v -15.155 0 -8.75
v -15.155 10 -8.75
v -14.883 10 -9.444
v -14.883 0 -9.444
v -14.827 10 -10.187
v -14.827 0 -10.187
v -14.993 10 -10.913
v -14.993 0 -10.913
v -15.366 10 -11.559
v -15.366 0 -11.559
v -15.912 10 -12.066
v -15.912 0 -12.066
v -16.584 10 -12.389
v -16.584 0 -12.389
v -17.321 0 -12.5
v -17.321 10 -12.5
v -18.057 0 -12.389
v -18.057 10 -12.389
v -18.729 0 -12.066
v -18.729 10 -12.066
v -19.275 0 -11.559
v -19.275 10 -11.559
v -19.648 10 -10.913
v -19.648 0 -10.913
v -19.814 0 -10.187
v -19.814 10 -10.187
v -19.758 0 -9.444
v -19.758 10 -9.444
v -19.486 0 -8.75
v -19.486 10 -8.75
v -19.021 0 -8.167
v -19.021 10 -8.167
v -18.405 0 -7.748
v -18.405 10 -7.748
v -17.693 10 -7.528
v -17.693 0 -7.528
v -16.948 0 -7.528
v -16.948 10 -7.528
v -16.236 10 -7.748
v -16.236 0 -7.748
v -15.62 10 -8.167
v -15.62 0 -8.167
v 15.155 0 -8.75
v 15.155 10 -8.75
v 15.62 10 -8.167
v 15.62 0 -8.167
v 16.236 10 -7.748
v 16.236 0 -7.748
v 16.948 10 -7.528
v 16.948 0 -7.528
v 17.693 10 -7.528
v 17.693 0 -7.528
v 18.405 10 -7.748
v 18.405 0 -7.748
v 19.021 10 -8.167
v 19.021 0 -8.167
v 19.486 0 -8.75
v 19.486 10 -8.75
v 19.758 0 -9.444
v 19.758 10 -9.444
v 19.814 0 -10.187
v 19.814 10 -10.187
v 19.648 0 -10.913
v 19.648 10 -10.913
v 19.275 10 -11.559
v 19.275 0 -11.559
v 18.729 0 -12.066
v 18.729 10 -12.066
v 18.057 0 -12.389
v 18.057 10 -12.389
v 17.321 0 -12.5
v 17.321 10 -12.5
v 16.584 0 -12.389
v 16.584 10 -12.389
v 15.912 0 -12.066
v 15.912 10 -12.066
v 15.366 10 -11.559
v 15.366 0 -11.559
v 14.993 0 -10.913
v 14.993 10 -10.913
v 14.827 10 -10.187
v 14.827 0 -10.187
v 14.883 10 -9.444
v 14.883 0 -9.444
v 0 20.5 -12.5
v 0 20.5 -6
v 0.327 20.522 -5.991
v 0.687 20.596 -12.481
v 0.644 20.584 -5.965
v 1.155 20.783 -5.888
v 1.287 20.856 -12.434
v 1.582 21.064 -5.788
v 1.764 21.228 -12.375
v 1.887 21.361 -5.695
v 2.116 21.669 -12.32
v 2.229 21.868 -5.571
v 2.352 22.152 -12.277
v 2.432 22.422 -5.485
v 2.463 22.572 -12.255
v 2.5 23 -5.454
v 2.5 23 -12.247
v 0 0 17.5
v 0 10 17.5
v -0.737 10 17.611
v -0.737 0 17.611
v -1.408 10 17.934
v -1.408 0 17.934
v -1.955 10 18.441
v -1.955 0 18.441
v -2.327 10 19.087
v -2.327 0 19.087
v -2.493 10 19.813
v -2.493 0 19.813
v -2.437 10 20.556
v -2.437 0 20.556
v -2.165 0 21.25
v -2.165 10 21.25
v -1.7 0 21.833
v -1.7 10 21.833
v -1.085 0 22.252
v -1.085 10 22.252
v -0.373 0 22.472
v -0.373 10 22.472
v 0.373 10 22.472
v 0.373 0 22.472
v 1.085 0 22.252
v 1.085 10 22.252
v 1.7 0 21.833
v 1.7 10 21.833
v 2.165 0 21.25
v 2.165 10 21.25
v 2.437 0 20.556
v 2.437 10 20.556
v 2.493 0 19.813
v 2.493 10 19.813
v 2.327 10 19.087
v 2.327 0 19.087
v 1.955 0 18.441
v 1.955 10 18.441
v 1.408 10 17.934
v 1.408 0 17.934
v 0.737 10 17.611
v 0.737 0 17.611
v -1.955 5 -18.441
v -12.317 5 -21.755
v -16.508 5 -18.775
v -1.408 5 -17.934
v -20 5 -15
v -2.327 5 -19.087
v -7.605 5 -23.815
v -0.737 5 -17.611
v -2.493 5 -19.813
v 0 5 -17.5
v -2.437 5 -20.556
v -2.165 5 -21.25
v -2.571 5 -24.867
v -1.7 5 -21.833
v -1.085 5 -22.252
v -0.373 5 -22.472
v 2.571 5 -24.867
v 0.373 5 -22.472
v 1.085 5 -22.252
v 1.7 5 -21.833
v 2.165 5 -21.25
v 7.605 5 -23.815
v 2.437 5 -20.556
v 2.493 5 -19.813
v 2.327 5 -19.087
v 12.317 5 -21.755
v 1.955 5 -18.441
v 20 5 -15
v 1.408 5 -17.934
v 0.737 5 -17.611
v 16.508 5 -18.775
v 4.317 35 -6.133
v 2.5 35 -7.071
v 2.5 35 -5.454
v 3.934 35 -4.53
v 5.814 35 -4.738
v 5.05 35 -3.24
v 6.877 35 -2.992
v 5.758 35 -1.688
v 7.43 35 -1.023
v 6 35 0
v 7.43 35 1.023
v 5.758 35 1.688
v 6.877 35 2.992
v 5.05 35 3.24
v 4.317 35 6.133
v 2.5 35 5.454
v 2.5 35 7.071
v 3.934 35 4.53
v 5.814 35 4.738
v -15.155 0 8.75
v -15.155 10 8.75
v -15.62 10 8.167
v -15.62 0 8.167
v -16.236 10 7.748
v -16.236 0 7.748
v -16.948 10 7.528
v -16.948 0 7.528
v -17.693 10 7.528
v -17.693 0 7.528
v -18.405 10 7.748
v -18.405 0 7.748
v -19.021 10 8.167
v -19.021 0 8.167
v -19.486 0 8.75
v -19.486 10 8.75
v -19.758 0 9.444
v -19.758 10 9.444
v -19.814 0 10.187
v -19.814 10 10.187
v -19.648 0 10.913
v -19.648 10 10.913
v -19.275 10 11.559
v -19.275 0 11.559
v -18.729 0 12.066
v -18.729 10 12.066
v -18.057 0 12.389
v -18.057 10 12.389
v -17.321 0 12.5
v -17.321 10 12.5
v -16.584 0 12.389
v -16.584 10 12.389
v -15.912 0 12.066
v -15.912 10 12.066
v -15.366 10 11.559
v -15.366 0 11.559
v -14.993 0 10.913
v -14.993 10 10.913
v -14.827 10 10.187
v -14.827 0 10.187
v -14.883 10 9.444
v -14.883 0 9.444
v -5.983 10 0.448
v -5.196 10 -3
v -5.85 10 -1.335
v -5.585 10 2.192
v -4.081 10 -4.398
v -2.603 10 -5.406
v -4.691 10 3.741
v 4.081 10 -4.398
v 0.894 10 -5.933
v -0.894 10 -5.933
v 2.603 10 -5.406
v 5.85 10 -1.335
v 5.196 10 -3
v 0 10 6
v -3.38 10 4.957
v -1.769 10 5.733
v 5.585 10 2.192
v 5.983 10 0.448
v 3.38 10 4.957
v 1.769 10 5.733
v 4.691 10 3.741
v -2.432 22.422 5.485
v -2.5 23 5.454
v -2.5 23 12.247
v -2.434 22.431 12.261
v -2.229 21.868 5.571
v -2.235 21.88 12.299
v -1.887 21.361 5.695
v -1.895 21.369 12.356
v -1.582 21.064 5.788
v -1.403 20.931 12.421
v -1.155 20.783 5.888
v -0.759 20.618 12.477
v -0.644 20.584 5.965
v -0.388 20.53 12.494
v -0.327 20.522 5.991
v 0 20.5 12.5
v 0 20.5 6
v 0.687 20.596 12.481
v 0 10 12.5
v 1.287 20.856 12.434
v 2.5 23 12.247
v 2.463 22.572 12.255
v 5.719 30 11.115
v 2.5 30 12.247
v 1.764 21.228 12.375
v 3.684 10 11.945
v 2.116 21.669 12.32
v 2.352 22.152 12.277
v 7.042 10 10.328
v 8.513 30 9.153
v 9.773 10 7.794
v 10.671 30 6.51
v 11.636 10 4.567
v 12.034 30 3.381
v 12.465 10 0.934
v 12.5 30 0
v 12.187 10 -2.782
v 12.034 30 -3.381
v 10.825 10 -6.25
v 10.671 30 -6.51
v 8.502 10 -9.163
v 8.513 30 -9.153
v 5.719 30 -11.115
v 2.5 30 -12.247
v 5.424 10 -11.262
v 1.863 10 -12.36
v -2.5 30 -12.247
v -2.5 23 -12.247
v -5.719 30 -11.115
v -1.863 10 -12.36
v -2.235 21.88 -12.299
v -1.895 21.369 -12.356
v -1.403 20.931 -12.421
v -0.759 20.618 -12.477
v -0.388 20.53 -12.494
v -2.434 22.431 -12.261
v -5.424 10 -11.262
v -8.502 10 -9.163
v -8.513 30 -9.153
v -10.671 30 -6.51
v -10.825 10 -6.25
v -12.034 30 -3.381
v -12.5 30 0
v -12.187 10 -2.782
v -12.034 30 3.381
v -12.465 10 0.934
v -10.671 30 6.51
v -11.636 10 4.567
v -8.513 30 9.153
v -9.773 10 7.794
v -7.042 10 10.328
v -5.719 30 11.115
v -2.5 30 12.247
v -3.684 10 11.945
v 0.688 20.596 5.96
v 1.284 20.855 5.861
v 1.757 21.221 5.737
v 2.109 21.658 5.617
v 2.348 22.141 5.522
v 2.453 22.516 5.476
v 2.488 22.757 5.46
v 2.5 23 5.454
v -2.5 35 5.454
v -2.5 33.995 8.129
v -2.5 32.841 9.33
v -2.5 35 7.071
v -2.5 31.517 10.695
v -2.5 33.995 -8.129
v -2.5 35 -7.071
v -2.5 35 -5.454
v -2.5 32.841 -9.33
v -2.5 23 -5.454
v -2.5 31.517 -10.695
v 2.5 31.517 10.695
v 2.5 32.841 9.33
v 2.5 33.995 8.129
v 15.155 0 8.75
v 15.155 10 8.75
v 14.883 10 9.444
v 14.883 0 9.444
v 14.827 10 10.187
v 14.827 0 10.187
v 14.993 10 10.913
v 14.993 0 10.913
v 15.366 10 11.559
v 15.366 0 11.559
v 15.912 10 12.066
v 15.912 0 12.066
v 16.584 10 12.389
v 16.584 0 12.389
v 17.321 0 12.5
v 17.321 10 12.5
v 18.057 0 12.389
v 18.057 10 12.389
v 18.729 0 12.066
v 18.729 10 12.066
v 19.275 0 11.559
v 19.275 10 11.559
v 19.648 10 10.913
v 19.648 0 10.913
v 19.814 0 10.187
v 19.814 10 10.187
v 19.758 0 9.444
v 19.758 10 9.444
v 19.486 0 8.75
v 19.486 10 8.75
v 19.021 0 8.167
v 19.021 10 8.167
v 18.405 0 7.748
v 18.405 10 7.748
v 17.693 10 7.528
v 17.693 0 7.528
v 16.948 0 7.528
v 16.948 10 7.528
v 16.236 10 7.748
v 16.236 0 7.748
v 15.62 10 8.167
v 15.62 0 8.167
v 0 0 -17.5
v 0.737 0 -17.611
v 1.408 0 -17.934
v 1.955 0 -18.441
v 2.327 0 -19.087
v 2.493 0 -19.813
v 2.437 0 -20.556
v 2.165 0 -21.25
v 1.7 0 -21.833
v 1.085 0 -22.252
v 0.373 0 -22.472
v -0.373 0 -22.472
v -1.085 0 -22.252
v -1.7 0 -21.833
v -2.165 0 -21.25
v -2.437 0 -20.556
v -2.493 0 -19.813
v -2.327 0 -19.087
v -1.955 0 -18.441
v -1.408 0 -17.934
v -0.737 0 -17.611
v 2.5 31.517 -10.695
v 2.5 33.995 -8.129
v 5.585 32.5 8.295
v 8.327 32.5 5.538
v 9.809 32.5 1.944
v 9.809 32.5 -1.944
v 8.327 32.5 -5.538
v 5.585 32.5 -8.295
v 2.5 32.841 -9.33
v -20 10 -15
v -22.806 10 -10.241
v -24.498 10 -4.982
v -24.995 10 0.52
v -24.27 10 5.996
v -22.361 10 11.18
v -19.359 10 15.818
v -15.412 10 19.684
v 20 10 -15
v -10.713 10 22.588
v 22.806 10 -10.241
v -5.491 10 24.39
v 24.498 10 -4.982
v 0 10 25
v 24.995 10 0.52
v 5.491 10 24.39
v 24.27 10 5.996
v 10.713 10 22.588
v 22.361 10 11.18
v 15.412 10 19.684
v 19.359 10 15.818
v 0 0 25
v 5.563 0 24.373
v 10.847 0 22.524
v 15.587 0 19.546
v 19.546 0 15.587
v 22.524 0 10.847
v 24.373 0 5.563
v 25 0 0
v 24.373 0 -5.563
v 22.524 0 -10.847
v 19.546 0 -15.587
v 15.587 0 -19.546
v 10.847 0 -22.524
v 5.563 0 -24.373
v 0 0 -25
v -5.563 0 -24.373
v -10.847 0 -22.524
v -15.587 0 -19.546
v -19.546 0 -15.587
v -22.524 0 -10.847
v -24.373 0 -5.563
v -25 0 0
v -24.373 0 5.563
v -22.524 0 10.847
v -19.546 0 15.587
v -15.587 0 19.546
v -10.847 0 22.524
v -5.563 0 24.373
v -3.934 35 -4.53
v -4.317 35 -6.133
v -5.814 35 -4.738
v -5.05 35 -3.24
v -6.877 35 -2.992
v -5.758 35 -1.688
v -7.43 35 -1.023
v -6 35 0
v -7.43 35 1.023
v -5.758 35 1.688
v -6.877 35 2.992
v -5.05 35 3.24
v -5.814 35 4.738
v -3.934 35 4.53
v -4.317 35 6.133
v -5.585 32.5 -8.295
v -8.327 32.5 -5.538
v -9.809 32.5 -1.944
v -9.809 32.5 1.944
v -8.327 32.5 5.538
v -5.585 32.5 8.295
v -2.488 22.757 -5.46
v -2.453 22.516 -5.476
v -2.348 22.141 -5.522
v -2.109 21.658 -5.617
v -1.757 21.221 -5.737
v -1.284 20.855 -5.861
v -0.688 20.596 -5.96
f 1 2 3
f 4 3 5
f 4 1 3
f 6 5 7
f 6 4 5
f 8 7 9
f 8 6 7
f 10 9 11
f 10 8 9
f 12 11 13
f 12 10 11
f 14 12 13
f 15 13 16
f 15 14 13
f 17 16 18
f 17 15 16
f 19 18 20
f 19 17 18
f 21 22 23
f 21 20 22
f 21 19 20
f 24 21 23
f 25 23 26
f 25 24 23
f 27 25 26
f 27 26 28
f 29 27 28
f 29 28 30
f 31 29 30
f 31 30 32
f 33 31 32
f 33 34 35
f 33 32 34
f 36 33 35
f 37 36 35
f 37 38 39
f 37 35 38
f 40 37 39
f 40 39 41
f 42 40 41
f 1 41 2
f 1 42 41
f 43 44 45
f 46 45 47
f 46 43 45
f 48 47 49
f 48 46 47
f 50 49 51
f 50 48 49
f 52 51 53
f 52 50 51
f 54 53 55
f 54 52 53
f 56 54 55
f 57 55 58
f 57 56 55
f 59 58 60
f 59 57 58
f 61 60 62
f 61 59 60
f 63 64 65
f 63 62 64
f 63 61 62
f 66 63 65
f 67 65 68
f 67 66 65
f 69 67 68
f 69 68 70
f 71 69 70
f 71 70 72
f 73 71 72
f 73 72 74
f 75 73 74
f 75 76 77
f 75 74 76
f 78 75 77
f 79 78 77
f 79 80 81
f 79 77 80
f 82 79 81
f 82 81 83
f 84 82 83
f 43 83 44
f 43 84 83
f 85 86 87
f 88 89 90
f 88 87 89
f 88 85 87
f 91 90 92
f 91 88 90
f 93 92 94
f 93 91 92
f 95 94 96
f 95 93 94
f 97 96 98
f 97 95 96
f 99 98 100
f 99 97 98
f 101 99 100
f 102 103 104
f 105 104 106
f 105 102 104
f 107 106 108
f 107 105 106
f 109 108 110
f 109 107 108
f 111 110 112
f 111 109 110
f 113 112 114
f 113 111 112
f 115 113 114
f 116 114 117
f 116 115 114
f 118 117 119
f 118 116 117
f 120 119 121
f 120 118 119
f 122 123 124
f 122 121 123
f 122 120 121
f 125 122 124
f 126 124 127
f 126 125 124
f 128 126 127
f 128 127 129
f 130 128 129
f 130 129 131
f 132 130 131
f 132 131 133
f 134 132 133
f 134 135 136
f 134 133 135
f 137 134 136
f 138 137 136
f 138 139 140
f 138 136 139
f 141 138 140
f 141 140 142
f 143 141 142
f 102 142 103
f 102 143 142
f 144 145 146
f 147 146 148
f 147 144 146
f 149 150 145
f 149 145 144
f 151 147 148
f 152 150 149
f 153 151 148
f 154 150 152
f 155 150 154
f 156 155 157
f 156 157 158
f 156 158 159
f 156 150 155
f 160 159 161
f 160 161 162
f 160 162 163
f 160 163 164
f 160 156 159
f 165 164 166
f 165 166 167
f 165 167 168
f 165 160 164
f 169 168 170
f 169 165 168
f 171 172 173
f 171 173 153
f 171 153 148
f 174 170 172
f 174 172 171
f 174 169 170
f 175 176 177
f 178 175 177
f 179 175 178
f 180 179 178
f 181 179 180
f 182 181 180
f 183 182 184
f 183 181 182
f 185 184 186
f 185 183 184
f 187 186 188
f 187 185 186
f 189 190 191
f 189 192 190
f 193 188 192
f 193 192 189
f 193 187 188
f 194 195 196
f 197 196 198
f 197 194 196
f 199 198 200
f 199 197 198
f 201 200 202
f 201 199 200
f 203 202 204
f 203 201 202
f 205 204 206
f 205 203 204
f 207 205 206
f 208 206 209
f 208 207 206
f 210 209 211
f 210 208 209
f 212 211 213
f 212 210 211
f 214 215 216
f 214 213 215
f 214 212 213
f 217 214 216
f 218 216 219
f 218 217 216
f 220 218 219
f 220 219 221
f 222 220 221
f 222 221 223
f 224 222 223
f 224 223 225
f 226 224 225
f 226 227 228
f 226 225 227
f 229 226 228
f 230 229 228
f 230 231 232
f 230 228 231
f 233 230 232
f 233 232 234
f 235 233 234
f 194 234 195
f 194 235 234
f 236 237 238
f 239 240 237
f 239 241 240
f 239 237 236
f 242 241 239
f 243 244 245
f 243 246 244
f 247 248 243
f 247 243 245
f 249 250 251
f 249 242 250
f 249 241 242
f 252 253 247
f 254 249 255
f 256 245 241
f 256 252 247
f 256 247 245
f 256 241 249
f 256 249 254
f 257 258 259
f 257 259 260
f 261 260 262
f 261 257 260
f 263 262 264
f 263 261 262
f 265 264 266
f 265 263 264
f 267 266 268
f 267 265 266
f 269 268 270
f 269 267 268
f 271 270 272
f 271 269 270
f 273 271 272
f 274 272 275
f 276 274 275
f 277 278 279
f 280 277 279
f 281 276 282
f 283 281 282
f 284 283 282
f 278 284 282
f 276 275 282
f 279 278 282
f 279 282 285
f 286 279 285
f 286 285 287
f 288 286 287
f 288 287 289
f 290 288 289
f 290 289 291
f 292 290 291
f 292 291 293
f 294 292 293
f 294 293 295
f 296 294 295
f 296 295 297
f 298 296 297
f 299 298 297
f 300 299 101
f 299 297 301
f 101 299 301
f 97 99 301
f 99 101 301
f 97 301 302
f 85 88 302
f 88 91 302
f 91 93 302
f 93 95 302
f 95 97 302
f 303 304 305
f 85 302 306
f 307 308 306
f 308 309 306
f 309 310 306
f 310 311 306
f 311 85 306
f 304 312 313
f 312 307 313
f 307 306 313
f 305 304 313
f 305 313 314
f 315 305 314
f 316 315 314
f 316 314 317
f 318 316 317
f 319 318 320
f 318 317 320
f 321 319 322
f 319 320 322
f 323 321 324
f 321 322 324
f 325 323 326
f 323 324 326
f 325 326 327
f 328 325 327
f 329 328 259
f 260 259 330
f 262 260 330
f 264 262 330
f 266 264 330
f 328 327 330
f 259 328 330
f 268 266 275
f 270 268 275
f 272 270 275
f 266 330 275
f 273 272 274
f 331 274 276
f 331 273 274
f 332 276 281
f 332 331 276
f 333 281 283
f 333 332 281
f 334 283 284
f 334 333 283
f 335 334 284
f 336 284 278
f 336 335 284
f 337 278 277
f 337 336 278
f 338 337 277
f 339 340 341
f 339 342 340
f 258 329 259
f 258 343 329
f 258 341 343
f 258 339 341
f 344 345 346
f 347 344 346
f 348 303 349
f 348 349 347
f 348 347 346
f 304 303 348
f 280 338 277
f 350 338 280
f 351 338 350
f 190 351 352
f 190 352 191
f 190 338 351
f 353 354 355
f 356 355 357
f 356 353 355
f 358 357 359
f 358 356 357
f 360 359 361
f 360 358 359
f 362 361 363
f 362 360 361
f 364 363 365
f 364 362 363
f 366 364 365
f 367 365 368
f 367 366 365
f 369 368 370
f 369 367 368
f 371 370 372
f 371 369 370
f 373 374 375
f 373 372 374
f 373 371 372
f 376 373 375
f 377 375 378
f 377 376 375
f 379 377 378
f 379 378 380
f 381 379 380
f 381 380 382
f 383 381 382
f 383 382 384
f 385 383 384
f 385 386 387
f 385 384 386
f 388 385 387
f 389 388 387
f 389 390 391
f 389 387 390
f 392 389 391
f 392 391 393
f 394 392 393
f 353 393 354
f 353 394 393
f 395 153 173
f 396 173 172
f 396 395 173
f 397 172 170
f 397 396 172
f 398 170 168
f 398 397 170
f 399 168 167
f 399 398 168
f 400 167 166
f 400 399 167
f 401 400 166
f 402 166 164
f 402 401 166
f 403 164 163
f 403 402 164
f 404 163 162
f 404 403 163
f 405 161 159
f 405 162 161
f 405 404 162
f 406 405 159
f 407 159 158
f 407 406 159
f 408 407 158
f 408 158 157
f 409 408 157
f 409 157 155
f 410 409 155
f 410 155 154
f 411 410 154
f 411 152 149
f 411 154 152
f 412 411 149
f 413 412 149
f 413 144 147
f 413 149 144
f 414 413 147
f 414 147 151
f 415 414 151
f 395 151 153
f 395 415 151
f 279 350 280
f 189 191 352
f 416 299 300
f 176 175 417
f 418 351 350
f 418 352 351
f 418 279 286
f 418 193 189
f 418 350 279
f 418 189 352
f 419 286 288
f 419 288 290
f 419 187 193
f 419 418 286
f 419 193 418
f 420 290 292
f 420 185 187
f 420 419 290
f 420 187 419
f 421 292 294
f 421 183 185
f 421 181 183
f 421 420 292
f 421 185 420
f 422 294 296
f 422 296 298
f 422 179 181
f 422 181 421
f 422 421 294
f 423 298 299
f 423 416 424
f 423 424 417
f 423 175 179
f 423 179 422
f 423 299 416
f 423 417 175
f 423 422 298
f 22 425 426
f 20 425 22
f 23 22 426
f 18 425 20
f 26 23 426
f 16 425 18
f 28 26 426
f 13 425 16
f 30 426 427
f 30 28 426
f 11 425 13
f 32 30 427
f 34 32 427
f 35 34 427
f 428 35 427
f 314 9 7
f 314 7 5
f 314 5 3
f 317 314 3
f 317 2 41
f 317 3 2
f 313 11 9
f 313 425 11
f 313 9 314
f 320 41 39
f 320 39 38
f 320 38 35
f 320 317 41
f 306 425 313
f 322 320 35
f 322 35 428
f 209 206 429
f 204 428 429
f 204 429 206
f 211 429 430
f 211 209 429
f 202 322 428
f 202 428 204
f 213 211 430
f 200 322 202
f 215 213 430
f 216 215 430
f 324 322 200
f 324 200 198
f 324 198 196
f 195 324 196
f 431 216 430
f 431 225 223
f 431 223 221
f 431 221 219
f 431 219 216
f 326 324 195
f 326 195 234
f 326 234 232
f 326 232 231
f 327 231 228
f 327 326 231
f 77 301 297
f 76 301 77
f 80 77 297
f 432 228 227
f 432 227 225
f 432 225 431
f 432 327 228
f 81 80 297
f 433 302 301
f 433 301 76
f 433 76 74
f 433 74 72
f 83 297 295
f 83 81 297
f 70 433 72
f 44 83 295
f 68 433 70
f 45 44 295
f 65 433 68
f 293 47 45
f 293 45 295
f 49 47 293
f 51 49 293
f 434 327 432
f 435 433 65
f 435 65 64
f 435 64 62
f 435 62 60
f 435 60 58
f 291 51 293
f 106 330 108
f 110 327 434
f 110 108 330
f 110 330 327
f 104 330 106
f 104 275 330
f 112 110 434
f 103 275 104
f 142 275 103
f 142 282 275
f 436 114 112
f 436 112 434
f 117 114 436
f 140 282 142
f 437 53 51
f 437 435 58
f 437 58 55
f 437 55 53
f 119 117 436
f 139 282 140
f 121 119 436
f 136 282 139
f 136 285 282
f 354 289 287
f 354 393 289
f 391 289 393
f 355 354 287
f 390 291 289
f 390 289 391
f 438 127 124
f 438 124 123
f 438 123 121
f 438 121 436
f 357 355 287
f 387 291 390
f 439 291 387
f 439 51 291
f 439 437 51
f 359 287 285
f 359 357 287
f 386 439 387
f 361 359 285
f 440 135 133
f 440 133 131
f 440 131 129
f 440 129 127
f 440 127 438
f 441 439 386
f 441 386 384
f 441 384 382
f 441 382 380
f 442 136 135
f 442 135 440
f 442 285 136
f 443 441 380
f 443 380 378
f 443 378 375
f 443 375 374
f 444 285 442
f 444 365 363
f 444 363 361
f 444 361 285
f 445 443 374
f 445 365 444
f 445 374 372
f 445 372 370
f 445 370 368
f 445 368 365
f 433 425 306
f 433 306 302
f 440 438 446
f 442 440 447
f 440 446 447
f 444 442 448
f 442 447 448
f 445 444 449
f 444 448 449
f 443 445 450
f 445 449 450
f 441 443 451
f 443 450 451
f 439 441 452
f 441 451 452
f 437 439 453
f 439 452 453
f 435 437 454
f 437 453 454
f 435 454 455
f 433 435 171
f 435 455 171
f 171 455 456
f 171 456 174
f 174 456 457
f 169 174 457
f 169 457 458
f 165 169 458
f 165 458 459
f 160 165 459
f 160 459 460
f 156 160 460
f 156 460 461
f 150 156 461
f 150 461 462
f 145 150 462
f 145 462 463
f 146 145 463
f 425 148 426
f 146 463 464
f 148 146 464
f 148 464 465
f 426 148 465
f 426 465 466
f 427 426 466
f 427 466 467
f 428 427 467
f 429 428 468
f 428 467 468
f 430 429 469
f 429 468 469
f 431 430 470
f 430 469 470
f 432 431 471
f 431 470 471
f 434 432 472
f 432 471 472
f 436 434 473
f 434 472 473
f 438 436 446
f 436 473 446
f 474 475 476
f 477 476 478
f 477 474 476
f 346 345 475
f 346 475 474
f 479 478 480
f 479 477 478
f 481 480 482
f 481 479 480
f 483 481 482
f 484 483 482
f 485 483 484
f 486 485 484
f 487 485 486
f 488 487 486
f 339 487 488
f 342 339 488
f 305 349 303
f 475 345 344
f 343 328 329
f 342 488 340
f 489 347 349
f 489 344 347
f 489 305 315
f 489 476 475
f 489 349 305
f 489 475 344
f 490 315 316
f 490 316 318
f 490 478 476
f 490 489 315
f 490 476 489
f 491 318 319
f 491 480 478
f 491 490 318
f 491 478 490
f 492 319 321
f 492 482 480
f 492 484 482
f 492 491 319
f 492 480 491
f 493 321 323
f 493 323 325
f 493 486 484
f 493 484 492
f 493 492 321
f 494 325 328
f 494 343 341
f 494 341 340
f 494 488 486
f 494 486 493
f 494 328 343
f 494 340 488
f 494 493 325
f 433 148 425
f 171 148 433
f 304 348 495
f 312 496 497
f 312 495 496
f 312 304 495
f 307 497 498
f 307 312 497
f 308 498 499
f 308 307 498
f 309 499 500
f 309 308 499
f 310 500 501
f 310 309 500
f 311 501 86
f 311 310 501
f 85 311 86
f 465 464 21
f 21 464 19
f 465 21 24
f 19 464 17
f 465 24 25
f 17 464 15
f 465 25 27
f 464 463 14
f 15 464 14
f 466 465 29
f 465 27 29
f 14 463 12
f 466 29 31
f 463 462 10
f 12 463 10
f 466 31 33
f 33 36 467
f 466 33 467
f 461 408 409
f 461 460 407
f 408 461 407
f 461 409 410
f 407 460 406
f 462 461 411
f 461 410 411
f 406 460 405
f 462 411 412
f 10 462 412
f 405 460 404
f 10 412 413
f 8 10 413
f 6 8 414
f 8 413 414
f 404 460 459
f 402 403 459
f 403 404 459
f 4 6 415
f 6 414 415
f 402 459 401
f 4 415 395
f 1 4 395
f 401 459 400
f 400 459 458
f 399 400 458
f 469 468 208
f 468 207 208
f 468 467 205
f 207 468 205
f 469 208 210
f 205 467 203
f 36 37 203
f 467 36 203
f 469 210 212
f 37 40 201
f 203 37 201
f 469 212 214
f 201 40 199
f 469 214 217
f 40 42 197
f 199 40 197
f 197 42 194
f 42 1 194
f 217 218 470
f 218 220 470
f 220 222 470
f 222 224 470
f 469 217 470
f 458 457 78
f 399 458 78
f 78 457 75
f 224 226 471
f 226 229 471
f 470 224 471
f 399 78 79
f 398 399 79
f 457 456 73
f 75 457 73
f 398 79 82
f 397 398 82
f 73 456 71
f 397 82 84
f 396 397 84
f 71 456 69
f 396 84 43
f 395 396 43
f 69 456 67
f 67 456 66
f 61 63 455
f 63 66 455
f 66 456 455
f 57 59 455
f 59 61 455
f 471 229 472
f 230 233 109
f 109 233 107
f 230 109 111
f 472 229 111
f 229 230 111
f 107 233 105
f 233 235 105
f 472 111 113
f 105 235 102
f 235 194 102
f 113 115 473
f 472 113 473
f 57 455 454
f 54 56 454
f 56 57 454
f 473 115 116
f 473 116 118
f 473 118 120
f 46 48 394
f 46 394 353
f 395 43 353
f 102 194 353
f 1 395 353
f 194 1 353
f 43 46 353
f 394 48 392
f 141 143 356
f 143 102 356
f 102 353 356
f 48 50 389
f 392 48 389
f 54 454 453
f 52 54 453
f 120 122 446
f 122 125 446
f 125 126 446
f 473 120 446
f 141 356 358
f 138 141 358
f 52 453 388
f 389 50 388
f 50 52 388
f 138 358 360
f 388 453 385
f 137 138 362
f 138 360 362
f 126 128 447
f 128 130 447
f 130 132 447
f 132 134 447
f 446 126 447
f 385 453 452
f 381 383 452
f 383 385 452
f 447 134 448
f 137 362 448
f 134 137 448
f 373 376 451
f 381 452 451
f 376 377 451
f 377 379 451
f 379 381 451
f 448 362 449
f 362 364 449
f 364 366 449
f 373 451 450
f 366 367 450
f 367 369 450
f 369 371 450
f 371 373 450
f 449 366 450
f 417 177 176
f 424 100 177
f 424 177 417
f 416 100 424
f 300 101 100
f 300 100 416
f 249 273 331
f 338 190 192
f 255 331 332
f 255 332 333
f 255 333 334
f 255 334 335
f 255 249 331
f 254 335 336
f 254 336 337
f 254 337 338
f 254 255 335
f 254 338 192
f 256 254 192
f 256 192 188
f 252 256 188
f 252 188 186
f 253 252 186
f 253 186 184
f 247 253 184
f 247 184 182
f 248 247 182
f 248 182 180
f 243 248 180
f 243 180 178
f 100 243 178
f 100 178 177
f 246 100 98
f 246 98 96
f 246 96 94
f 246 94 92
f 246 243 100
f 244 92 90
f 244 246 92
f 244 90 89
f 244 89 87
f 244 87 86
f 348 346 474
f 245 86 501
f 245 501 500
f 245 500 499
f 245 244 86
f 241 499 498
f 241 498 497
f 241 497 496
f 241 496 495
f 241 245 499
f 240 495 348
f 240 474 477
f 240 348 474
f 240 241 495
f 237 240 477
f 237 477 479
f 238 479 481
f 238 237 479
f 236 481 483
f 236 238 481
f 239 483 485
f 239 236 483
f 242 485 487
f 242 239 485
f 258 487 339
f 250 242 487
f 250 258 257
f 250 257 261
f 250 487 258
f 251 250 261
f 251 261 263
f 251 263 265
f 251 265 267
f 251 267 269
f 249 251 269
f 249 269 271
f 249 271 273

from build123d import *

# Parameters (mm, degrees)
SKETCH1_R               = 25
BOSS_EXTRUDE1_DEPTH     = 10
SKETCH1_3_R             = 12.5
SKETCH1_3_R_2           = 6
BOSS_EXTRUDE2_DEPTH     = 35
CUT_EXTRUDE1_START      = 5
CUT_EXTRUDE1_DEPTH      = 5
CUT_EXTRUDE2_DEPTH      = 50.749371855
CUT_EXTRUDE2_DEPTH_BACK = 50.749371855
SKETCH3_R               = 2.5
CUT_EXTRUDE3_DEPTH      = 50.749371926
CIRPATTERN1_COUNT       = 6
CHAMFER1_SIZE           = 5


with BuildPart() as part:
    # Sketch1 → Boss-Extrude1 (new body)
    with BuildSketch(Plane(origin=(0, 0, 0), x_dir=(1, 0, 0), z_dir=(0, 1, 0))):
        with Locations(Location((0, 0, 0), (0, 0, 270))):
            Circle(SKETCH1_R)
    extrude(amount=BOSS_EXTRUDE1_DEPTH)

    # Sketch1<3> → Boss-Extrude2 (add)
    with BuildSketch(Plane(origin=(0, 0, 0), x_dir=(1, 0, 0), z_dir=(0, 1, 0))):
        with Locations(Location((0, 0, 0), (0, 0, 270))):
            Circle(SKETCH1_3_R)
        with Locations(Location((0, 0, 0), (0, 0, 270))):
            Circle(SKETCH1_3_R_2, mode=Mode.SUBTRACT)
    extrude(amount=BOSS_EXTRUDE2_DEPTH)

    # Sketch1<5> → Cut-Extrude1 (cut)
    with BuildSketch(Plane(origin=(0, 0, 0), x_dir=(1, 0, 0), z_dir=(0, 1, 0)).offset(CUT_EXTRUDE1_START)):
        with BuildLine():
            ThreePointArc((20, 15), (0, 25), (-20, 15))
            Line((-20, 15), (20, 15))
        make_face()
    extrude(amount=CUT_EXTRUDE1_DEPTH, mode=Mode.SUBTRACT)

    # Sketch2 → Cut-Extrude2 (cut, two sides: drawn at the far end of the back side and taken through both)
    with BuildSketch(Plane.XY.offset(-CUT_EXTRUDE2_DEPTH_BACK)):
        with BuildLine():
            Line((0, 25.5), (0, 35))
            Line((0, 35), (-2.5, 35))
            Line((-2.5, 35), (-2.5, 23))
            ThreePointArc((-2.5, 23), (-1.767766953, 24.767766953), (0, 25.5))
        make_face()
        with BuildLine():
            Line((2.5, 35), (0, 35))
            Line((0, 35), (0, 25.5))
            ThreePointArc((0, 25.5), (1.767766953, 24.767766953), (2.5, 23))
            Line((2.5, 23), (2.5, 35))
        make_face()
        with BuildLine():
            ThreePointArc((2.5, 23), (1.767766953, 24.767766953), (0, 25.5))
            Line((0, 25.5), (0, 23))
            Line((0, 23), (2.5, 23))
        make_face()
        with BuildLine():
            Line((0, 23), (0, 25.5))
            ThreePointArc((0, 25.5), (-1.767766953, 24.767766953), (-2.5, 23))
            Line((-2.5, 23), (0, 23))
        make_face()
        with BuildLine():
            Line((2.5, 23), (0, 23))
            Line((0, 23), (0, 20.5))
            ThreePointArc((0, 20.5), (1.767766953, 21.232233047), (2.5, 23))
        make_face()
        with BuildLine():
            Line((0, 20.5), (0, 23))
            Line((0, 23), (-2.5, 23))
            ThreePointArc((-2.5, 23), (-1.767766953, 21.232233047), (0, 20.5))
        make_face()
    extrude(amount=CUT_EXTRUDE2_DEPTH + CUT_EXTRUDE2_DEPTH_BACK, mode=Mode.SUBTRACT)

    # Sketch3 → Cut-Extrude3 (cut, through all)
    with BuildSketch(Plane(origin=(0, 0, 0), x_dir=(1, 0, 0), z_dir=(0, 1, 0))):
        with Locations(Location((0, 20, 0), (0, 0, 270))):
            Circle(SKETCH3_R)
    cut_extrude3 = extrude(amount=CUT_EXTRUDE3_DEPTH, mode=Mode.SUBTRACT)

    # CirPattern1: Cut-Extrude3 ×6 about axis
    cirpattern1_axis = Axis((0, 0, 0), (0, 1, 0))
    for i in range(1, CIRPATTERN1_COUNT):
        add(cut_extrude3.rotate(cirpattern1_axis, i * 360 / CIRPATTERN1_COUNT), mode=Mode.SUBTRACT)

    # Chamfer1
    chamfer1_edges = [part.edges().sort_by_distance(p)[0] for p in [
        (-12.5, 35, 0),
        (12.5, 35, 0),
    ]]
    chamfer(chamfer1_edges, length=CHAMFER1_SIZE)


solid = part.part
